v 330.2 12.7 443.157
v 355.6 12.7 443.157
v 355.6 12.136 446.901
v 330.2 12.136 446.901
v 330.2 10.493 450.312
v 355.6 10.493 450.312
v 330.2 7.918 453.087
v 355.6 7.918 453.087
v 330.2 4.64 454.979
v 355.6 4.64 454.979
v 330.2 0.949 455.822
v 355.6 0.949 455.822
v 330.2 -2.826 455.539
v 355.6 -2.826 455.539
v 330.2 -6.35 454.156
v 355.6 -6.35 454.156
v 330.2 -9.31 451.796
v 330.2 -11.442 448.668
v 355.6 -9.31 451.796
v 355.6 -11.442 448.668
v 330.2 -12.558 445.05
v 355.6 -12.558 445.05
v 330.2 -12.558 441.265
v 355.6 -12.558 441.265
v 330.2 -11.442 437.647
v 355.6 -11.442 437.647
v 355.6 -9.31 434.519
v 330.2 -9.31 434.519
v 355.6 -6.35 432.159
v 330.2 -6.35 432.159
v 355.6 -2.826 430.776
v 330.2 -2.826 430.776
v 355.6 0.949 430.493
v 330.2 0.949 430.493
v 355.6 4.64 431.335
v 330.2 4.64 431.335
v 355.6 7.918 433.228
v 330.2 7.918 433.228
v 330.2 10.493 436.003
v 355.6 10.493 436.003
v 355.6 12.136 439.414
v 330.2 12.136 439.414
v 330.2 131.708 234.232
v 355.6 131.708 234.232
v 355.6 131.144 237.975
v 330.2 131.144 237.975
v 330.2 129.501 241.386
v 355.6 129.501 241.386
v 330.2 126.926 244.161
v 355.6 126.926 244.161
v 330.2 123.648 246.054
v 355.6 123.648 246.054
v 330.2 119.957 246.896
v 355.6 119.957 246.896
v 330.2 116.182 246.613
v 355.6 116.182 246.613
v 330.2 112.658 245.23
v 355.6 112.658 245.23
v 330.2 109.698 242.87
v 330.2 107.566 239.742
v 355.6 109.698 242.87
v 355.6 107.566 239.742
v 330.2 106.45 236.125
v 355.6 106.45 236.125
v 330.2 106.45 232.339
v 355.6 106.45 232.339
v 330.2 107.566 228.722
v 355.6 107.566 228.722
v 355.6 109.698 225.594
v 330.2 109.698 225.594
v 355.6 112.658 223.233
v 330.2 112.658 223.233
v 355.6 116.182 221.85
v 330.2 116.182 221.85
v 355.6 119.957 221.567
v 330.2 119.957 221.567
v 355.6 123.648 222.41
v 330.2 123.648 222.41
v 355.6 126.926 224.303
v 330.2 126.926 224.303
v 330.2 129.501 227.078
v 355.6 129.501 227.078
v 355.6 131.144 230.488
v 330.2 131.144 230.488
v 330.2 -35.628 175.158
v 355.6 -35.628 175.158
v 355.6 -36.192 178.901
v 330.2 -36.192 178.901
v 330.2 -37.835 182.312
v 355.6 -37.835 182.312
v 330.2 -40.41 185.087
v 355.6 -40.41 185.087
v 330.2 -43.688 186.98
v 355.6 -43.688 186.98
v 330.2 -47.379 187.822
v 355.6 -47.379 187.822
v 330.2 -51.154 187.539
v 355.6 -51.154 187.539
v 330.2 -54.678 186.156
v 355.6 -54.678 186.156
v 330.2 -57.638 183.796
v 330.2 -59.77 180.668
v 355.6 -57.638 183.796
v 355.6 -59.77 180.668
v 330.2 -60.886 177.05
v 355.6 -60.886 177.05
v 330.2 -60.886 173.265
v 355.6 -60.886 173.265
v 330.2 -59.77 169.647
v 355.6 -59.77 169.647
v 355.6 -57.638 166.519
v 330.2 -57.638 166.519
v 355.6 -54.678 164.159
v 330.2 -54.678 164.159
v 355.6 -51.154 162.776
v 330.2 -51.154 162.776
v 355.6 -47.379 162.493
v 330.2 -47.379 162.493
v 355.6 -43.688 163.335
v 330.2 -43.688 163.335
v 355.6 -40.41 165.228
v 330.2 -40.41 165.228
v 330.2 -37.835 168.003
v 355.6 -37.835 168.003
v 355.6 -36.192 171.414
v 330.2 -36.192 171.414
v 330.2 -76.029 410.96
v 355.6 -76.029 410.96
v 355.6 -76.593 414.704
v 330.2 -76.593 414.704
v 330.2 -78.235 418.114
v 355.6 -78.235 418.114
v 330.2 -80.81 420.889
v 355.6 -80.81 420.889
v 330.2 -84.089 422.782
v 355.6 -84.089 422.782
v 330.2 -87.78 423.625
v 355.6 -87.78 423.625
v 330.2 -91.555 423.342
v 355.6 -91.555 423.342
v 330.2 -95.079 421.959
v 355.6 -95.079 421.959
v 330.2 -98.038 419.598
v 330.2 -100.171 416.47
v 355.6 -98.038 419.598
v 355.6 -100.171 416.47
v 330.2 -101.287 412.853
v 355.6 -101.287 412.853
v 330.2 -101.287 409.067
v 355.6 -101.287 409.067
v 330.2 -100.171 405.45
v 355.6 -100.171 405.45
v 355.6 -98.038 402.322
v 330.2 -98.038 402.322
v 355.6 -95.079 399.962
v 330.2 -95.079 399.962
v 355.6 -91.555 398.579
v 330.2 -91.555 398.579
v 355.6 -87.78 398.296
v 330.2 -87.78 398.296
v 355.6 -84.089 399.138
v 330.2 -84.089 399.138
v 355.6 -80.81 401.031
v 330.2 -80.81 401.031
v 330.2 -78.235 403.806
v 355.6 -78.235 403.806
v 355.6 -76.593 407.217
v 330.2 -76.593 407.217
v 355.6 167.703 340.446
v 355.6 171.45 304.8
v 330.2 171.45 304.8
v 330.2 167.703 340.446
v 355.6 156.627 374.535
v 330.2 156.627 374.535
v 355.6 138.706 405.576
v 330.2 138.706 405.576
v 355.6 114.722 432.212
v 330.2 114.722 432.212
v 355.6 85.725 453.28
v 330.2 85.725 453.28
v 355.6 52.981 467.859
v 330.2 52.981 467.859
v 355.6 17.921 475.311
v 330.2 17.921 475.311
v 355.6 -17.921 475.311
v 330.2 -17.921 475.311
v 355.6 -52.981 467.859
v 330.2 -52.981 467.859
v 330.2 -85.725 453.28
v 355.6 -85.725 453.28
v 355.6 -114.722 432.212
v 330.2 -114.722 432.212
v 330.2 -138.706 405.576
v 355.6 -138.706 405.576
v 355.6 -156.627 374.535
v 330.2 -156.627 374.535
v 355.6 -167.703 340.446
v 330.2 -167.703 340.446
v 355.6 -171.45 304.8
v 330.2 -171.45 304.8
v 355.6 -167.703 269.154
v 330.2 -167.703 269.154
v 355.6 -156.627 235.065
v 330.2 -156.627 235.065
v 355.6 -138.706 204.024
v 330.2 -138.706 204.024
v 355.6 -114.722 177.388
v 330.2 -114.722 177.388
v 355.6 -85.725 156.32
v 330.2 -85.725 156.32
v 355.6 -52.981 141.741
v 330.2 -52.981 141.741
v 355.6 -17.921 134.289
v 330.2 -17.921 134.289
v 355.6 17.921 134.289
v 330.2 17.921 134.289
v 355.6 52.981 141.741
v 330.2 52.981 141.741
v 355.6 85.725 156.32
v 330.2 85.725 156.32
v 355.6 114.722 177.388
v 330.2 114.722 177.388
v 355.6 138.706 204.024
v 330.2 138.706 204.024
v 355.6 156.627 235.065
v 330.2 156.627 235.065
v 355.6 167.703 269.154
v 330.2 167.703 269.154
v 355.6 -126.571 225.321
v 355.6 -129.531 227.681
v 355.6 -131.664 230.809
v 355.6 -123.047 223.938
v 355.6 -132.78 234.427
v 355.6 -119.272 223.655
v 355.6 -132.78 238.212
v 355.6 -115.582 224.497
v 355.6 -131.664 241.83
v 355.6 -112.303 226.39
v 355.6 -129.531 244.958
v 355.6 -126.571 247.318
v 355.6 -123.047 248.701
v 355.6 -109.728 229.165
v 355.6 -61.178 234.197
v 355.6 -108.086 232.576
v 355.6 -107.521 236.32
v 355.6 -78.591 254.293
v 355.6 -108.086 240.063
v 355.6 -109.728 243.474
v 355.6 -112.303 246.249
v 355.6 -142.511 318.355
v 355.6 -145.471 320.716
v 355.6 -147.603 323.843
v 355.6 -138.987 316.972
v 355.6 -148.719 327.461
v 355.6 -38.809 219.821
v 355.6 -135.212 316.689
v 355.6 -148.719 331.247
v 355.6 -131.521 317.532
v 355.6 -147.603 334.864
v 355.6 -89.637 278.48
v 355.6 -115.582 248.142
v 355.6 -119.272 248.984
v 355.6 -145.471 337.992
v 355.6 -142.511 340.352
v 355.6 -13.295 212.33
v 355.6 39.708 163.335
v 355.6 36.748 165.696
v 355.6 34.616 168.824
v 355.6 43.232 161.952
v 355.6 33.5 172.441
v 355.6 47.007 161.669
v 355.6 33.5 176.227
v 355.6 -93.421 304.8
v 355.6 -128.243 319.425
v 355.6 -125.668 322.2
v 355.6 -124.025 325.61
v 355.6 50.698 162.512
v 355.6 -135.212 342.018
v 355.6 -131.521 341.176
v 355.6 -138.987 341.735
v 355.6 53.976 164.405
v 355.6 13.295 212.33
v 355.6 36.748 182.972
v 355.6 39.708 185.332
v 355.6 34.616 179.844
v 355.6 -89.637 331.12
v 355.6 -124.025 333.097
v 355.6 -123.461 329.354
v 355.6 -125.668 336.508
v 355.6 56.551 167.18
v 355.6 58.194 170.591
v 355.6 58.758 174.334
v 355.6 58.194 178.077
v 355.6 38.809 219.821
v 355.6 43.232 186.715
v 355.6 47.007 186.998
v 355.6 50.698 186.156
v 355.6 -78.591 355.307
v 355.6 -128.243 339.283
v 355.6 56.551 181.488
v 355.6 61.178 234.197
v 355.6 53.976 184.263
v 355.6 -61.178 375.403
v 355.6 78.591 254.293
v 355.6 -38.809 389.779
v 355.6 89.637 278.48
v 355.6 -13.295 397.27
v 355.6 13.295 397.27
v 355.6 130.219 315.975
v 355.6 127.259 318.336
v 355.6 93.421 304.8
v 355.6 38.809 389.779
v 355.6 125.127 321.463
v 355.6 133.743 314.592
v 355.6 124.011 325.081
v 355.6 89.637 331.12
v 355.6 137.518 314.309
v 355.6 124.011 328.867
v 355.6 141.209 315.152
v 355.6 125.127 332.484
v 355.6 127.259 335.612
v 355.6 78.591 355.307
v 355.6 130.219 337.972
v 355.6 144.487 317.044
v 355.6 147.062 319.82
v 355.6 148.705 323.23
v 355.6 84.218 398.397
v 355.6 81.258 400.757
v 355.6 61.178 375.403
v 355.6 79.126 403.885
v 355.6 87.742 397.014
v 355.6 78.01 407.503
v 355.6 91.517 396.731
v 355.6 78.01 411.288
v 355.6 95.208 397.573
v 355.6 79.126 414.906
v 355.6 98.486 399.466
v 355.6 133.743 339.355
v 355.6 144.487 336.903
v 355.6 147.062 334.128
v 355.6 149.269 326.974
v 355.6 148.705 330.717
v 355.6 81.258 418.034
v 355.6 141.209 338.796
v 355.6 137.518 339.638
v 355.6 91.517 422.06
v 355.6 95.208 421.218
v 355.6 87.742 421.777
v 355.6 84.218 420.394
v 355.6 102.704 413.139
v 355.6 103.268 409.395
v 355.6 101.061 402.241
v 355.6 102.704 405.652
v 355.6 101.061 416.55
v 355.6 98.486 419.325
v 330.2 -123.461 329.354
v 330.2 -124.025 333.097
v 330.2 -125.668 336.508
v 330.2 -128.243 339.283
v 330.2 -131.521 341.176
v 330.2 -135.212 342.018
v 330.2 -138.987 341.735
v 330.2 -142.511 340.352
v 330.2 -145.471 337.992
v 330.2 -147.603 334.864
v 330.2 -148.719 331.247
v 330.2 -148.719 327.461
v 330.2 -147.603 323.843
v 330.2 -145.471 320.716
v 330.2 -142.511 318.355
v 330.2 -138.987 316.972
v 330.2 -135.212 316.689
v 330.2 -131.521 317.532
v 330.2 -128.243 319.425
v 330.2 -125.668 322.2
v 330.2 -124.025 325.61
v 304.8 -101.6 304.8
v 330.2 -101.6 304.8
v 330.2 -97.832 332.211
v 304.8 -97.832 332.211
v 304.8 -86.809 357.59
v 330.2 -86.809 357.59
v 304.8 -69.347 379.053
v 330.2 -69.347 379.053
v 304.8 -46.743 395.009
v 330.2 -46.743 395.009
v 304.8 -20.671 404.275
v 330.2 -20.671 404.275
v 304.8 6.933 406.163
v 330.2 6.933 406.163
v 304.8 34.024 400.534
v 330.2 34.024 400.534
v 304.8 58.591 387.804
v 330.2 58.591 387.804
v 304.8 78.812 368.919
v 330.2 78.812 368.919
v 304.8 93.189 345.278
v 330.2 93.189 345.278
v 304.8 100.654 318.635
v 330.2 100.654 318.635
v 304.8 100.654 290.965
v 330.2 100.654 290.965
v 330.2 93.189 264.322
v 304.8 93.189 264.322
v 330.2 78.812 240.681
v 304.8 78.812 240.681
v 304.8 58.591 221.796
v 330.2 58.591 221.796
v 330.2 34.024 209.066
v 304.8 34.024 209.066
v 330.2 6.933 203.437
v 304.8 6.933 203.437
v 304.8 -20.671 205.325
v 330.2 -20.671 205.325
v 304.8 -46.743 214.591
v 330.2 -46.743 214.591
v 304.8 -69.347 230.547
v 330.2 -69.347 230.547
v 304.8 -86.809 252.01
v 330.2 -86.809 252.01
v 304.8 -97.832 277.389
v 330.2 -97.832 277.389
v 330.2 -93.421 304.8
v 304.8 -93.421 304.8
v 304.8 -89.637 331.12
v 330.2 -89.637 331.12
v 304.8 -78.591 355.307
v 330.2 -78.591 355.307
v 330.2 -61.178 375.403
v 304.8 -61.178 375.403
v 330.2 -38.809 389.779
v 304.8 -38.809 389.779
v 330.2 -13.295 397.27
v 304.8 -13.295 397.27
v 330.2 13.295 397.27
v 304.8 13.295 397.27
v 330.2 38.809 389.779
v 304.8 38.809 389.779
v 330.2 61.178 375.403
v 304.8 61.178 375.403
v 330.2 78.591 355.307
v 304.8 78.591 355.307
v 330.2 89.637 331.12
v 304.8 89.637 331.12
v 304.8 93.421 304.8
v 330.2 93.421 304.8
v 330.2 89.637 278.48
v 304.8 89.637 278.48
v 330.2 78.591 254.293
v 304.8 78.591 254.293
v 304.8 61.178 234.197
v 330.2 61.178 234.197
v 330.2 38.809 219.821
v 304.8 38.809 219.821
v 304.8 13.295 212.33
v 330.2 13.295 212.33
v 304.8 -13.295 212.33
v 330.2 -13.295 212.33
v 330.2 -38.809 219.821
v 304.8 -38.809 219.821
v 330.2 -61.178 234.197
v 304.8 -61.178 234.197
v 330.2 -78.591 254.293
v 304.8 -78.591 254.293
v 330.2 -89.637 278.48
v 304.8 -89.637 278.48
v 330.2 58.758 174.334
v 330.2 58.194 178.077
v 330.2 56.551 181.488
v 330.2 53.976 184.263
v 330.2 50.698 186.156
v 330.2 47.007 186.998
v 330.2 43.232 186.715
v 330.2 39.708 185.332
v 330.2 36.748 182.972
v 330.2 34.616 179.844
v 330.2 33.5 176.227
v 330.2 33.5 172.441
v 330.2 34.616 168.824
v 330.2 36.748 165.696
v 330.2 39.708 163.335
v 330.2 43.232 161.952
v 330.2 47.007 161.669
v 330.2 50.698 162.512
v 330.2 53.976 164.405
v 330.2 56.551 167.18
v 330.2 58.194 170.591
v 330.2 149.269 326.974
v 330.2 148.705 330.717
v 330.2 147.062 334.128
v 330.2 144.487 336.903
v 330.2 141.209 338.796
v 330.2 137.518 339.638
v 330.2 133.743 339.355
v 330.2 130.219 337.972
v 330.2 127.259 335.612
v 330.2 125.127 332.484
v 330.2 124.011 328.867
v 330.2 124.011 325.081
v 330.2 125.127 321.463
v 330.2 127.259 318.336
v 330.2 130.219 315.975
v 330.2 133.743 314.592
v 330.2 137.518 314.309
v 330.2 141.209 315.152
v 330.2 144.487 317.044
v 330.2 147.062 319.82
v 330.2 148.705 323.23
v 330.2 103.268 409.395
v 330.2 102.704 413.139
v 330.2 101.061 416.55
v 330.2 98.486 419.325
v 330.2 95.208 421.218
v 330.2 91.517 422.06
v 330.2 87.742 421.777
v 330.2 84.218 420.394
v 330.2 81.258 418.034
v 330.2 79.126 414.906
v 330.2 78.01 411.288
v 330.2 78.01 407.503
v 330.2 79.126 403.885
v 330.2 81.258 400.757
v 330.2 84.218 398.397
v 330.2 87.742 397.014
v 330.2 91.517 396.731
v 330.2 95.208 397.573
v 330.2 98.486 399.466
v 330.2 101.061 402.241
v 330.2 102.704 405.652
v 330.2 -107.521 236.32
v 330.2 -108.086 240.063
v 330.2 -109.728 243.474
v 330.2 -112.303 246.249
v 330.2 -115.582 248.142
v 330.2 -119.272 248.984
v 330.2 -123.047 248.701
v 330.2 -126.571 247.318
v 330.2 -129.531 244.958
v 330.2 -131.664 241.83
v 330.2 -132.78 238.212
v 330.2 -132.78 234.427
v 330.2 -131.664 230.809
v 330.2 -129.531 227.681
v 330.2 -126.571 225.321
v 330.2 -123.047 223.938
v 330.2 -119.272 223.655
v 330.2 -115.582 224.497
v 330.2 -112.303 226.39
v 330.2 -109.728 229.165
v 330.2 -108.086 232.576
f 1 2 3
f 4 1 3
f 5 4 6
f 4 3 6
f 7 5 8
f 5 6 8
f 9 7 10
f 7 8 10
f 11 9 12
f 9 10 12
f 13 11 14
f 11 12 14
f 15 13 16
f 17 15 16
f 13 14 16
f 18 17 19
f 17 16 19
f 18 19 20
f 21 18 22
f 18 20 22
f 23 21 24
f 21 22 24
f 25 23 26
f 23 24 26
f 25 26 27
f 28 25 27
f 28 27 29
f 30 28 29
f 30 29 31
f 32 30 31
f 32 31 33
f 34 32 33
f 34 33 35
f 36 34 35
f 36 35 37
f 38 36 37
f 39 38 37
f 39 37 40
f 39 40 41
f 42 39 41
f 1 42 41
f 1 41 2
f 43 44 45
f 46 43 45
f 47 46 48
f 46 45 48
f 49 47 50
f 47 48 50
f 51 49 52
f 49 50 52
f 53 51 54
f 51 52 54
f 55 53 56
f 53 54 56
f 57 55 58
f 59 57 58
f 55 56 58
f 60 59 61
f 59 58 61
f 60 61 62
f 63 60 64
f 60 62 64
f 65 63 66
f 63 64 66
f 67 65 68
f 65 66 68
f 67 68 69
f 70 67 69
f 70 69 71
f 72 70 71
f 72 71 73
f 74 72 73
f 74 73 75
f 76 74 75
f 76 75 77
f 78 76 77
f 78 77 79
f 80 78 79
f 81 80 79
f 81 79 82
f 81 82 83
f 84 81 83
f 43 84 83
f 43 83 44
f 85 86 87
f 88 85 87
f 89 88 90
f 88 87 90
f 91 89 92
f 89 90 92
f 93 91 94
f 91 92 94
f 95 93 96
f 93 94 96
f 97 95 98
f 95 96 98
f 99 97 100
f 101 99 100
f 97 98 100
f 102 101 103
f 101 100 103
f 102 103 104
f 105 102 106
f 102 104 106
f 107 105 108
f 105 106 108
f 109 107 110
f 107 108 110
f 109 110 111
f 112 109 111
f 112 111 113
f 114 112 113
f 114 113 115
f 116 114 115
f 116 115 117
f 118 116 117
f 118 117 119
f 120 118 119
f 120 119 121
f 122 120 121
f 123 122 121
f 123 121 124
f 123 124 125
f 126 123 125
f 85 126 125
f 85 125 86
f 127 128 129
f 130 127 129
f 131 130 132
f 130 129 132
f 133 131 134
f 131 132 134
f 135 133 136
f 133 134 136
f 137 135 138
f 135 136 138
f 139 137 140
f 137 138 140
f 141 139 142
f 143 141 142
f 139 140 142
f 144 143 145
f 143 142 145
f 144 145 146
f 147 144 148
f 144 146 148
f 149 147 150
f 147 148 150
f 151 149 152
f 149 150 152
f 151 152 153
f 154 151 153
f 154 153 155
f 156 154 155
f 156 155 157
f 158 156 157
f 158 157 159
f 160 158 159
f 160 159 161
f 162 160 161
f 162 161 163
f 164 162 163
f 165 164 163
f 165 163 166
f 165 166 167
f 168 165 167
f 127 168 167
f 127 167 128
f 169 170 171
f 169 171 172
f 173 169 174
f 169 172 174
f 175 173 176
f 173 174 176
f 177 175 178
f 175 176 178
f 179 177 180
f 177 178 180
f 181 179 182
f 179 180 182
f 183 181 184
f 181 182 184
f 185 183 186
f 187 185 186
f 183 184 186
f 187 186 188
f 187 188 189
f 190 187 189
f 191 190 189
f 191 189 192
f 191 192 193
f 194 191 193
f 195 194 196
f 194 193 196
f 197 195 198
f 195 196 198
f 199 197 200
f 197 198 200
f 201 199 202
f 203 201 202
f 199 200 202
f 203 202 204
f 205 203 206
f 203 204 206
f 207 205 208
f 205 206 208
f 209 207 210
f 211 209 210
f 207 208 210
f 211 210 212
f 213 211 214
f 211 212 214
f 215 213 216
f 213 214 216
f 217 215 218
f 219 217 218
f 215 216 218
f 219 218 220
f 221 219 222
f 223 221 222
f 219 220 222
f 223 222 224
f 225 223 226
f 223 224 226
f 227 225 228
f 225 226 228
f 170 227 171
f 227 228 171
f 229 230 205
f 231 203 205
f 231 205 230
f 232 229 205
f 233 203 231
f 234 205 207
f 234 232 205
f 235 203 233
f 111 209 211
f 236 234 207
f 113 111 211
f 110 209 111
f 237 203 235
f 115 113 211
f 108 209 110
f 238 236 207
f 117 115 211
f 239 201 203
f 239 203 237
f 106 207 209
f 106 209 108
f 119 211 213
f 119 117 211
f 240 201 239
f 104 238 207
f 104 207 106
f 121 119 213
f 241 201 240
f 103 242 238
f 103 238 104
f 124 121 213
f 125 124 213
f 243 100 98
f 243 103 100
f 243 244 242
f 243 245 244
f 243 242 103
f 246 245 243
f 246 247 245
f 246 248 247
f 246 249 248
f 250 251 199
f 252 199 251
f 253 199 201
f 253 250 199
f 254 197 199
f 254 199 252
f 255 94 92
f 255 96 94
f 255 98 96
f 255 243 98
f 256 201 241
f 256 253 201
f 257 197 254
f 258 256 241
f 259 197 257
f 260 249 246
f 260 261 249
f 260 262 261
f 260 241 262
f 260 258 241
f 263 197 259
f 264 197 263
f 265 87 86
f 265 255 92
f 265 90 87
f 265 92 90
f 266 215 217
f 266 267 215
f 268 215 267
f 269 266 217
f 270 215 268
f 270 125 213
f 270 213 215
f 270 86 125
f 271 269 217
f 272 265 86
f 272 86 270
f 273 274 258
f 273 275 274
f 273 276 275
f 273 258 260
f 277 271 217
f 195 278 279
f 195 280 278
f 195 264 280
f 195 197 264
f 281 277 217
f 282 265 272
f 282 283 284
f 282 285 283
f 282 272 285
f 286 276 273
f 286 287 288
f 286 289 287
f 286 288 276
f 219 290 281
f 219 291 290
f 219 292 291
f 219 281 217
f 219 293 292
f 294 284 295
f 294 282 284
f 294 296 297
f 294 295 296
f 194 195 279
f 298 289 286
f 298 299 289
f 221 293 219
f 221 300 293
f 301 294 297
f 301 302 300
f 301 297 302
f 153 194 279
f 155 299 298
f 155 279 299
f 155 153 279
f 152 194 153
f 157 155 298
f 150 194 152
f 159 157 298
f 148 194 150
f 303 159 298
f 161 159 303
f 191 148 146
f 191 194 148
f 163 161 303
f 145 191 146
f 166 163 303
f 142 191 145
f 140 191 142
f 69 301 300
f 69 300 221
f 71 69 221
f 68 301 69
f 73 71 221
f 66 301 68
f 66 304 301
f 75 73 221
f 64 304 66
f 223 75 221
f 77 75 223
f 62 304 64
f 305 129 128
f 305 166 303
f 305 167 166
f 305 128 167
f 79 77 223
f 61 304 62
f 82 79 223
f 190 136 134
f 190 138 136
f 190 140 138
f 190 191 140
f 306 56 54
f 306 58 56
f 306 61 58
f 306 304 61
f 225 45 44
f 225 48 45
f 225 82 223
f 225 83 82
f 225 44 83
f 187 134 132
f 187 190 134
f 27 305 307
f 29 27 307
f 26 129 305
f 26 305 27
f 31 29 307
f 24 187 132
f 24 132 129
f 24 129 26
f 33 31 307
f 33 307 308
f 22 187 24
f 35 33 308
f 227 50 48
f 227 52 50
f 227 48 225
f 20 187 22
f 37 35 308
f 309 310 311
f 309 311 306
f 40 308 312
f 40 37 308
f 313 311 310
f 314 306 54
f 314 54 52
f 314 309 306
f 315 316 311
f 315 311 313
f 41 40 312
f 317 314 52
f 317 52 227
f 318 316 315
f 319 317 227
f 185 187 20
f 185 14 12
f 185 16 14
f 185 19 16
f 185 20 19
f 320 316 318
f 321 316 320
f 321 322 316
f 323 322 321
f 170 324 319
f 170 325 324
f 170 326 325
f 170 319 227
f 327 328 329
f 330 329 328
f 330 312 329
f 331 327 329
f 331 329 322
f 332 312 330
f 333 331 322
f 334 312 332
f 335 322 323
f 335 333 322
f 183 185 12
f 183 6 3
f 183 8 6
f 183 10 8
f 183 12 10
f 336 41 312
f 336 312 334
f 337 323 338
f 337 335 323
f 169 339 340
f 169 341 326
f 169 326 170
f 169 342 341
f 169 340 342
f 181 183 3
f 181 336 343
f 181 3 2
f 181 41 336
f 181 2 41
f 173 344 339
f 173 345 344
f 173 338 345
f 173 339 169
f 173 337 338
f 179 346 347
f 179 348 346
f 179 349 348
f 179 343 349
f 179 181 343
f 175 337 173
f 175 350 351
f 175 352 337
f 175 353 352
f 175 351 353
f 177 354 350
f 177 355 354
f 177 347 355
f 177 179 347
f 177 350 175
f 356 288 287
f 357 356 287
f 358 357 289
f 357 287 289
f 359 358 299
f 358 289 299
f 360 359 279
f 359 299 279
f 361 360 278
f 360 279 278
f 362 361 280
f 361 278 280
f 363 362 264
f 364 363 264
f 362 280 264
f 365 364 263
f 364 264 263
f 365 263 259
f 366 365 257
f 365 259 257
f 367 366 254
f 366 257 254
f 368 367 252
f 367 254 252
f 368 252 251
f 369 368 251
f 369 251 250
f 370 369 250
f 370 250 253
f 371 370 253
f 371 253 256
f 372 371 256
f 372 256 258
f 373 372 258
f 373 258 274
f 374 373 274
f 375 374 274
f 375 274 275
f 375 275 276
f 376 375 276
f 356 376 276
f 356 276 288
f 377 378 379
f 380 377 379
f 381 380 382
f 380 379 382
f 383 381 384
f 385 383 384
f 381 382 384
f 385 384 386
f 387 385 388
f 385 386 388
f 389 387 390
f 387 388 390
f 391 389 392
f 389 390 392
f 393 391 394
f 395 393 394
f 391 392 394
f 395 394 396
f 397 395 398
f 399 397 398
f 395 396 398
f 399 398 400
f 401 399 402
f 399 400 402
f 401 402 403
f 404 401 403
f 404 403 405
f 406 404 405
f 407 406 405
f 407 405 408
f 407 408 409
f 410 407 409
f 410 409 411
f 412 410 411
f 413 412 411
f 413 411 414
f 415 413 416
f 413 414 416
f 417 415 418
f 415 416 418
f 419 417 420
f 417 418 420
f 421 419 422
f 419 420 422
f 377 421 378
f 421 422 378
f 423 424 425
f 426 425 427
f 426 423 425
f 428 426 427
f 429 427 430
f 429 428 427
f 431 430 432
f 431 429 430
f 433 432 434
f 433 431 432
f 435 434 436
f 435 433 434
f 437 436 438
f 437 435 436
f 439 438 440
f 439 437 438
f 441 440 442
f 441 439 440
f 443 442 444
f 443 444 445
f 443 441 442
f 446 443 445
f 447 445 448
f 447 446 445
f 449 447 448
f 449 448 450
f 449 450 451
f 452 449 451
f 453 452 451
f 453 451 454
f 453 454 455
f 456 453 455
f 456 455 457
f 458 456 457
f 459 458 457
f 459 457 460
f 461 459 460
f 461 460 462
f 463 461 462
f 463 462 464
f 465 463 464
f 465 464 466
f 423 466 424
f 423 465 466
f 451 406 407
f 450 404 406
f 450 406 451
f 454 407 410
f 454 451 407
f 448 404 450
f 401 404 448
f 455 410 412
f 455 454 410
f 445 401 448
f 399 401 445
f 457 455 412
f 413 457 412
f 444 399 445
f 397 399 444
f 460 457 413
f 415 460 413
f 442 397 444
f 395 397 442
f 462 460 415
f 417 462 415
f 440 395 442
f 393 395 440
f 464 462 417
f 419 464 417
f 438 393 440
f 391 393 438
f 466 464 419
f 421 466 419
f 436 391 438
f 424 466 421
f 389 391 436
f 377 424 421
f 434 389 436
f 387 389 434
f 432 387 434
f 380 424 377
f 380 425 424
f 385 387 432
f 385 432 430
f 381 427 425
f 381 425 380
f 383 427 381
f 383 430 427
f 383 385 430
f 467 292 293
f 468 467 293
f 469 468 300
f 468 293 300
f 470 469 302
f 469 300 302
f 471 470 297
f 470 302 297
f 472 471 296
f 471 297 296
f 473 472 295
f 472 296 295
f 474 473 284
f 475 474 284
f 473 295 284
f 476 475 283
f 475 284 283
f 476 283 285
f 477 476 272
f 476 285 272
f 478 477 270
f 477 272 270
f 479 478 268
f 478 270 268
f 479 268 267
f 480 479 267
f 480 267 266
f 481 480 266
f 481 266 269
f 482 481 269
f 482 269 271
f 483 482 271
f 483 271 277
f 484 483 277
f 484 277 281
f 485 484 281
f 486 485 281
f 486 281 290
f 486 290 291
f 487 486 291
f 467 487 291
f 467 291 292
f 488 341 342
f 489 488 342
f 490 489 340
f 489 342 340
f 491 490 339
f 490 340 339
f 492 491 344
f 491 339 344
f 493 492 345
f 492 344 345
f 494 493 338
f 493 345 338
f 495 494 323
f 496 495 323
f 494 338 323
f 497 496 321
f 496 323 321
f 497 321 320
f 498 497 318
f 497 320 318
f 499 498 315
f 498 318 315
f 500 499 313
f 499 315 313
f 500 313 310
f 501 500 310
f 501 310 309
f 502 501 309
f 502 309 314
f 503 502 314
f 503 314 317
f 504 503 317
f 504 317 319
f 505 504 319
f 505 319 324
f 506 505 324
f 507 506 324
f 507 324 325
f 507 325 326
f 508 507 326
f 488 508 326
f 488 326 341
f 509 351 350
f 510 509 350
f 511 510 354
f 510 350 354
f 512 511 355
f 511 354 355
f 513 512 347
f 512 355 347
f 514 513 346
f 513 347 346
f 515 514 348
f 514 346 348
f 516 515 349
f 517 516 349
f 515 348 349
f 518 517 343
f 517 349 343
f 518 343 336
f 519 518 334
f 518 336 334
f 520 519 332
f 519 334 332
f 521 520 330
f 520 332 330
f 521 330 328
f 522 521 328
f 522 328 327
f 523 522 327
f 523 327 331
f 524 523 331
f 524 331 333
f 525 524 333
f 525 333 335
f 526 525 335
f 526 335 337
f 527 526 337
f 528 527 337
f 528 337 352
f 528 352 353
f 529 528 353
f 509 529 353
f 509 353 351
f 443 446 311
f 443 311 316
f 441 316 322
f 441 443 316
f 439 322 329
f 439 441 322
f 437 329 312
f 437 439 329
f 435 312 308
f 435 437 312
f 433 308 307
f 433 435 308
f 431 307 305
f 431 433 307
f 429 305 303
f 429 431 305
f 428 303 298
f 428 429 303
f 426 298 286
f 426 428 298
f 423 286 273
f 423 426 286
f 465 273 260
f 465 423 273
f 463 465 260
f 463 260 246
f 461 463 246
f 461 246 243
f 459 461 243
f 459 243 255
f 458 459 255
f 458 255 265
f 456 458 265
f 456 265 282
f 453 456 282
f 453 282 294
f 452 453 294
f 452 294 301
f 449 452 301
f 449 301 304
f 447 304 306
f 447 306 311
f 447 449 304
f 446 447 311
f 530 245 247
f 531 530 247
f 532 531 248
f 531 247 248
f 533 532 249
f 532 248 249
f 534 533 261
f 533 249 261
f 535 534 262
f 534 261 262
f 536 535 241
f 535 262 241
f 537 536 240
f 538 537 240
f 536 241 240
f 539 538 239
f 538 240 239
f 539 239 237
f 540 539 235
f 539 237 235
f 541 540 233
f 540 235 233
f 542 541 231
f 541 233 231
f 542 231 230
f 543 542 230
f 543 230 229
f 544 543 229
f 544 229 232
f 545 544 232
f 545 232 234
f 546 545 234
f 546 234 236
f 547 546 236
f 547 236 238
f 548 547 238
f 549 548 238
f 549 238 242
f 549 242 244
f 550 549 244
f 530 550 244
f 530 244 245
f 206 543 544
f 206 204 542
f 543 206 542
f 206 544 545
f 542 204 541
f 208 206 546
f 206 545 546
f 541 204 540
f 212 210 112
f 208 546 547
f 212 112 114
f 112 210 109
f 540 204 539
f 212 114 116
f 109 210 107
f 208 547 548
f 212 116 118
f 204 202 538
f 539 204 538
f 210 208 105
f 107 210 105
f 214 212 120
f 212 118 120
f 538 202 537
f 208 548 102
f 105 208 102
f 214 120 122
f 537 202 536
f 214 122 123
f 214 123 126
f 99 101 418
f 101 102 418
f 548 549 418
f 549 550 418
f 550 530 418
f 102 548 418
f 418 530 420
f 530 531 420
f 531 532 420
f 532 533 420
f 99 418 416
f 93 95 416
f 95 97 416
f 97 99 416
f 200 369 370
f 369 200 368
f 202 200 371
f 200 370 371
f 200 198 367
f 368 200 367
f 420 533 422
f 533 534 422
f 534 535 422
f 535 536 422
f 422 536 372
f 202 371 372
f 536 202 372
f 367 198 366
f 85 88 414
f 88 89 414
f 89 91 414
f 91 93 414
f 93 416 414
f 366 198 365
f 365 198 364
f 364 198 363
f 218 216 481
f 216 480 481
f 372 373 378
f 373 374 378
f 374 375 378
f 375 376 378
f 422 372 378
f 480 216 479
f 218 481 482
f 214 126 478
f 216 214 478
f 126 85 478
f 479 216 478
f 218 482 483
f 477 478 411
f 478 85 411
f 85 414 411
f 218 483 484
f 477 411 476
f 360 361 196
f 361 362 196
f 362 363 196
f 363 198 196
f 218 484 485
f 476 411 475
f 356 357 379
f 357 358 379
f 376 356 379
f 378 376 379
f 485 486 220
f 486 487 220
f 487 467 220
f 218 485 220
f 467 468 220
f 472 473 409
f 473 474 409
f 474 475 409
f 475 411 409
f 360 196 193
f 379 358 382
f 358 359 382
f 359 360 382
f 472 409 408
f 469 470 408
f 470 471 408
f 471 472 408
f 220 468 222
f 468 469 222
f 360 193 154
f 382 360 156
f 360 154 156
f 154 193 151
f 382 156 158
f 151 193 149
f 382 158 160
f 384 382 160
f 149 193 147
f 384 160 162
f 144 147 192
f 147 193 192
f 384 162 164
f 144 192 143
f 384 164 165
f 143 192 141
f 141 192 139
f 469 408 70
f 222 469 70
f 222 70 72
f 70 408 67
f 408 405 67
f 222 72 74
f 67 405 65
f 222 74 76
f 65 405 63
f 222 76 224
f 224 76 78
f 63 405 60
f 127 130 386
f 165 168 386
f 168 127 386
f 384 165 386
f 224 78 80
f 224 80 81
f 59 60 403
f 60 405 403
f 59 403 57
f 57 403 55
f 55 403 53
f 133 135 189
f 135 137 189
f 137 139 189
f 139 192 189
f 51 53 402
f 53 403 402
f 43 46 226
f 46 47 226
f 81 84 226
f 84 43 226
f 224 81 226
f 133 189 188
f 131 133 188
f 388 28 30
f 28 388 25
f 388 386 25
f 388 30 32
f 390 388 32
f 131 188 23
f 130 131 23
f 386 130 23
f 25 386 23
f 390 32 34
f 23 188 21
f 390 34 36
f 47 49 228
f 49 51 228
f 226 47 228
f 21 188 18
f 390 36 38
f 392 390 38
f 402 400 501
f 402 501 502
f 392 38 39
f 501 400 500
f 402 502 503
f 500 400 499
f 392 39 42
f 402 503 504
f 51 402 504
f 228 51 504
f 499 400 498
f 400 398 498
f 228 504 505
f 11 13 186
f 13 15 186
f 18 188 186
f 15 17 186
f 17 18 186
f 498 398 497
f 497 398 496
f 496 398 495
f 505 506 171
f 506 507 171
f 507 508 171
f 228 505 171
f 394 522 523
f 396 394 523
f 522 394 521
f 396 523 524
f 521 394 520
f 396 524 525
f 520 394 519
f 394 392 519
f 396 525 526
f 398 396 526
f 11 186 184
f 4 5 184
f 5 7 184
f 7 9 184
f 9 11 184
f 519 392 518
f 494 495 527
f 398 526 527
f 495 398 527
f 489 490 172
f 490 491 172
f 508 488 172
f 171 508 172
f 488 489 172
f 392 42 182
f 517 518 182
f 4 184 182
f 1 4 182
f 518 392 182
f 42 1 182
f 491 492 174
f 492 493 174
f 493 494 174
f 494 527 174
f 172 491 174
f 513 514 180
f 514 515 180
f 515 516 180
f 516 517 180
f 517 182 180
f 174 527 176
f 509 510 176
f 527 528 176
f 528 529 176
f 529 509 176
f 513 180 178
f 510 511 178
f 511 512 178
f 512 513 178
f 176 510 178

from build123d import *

# Parameters (mm, degrees)
F0_R      = 101.6
F0_R_2    = 93.4212
F3_DEPTH  = 25.4
F4_R      = 171.45
F4_R_2    = 93.4212
F5_DEPTH  = 25.4
F6_SIZE   = 5.08
F7_R      = 12.7
F8_DEPTH  = 457.1692501
F10_R     = 101.6
F10_R_2   = 93.4212
F11_DEPTH = 25.4


with BuildPart() as f2:
    # F2: sweep along a path in F1
    with BuildLine(Plane.XZ) as f2_path:
        ThreePointArc((0, 0), (89.2738530943, 215.5261469057), (304.8, 304.8))
    # F0 (on Top) → F2 (sweep)
    with BuildSketch(Plane.XY):
        Circle(F0_R)
        Circle(F0_R_2, mode=Mode.SUBTRACT)
    sweep(path=f2_path.line)

    # F3 (add): a face of the model
    f3_faces = [f2.faces().sort_by_distance(p)[0] for p in [
        (304.8, 0, 403.5263180413),
    ]]
    extrude(f3_faces, amount=F3_DEPTH)

    # F6
    f6_edges = [f2.edges().sort_by_distance(p)[0] for p in [
        (-101.6, 0, 0),
    ]]
    chamfer(f6_edges, length=F6_SIZE)


with BuildPart() as f5:
    # F4 (on face) → F5 (new body)
    with BuildSketch(Plane.YZ.offset(330.2)):
        with Locations((0, 304.8)):
            Circle(F4_R)
        with Locations((0, 304.8)):
            Circle(F4_R_2, mode=Mode.SUBTRACT)
    extrude(amount=F5_DEPTH)


with BuildPart() as f8_tool:
    # F7 (on face) → F8 (new body, through all)
    with BuildSketch(Plane.YZ.offset(355.6)):
        with Locations((-88.7286911595, 410.9601527047)):
            Circle(F7_R)
        with Locations((0, 443.1573585219)):
            Circle(F7_R)
        with Locations((90.5679274826, 409.3954548185)):
            Circle(F7_R)
        with Locations((136.5689763149, 326.9737088793)):
            Circle(F7_R)
        with Locations((119.0079640377, 234.2318545463)):
            Circle(F7_R)
        with Locations((46.0581534638, 174.3338926898)):
            Circle(F7_R)
        with Locations((-48.328086115, 175.1575889239)):
            Circle(F7_R)
        with Locations((-120.2214225043, 236.3195777744)):
            Circle(F7_R)
        with Locations((-136.1611916187, 329.3537889975)):
            Circle(F7_R)
    extrude(amount=-F8_DEPTH)


with BuildPart() as f2_1:
    add(f2.part)

    # F8: cut by f8_tool
    add(f8_tool.part, mode=Mode.SUBTRACT)


with BuildPart() as f5_1:
    add(f5.part)

    # F8: cut by f8_tool
    add(f8_tool.part, mode=Mode.SUBTRACT)

    # F10 (on face) → F11 (join)
    with BuildSketch(Plane(origin=(330.2, 0, 0), x_dir=(0, -1, 0), z_dir=(-1, 0, 0))):
        with Locations((0, 304.8)):
            Circle(F10_R)
        with Locations((0, 304.8)):
            Circle(F10_R_2, mode=Mode.SUBTRACT)
    extrude(amount=F11_DEPTH)


solid = f5_1.part
